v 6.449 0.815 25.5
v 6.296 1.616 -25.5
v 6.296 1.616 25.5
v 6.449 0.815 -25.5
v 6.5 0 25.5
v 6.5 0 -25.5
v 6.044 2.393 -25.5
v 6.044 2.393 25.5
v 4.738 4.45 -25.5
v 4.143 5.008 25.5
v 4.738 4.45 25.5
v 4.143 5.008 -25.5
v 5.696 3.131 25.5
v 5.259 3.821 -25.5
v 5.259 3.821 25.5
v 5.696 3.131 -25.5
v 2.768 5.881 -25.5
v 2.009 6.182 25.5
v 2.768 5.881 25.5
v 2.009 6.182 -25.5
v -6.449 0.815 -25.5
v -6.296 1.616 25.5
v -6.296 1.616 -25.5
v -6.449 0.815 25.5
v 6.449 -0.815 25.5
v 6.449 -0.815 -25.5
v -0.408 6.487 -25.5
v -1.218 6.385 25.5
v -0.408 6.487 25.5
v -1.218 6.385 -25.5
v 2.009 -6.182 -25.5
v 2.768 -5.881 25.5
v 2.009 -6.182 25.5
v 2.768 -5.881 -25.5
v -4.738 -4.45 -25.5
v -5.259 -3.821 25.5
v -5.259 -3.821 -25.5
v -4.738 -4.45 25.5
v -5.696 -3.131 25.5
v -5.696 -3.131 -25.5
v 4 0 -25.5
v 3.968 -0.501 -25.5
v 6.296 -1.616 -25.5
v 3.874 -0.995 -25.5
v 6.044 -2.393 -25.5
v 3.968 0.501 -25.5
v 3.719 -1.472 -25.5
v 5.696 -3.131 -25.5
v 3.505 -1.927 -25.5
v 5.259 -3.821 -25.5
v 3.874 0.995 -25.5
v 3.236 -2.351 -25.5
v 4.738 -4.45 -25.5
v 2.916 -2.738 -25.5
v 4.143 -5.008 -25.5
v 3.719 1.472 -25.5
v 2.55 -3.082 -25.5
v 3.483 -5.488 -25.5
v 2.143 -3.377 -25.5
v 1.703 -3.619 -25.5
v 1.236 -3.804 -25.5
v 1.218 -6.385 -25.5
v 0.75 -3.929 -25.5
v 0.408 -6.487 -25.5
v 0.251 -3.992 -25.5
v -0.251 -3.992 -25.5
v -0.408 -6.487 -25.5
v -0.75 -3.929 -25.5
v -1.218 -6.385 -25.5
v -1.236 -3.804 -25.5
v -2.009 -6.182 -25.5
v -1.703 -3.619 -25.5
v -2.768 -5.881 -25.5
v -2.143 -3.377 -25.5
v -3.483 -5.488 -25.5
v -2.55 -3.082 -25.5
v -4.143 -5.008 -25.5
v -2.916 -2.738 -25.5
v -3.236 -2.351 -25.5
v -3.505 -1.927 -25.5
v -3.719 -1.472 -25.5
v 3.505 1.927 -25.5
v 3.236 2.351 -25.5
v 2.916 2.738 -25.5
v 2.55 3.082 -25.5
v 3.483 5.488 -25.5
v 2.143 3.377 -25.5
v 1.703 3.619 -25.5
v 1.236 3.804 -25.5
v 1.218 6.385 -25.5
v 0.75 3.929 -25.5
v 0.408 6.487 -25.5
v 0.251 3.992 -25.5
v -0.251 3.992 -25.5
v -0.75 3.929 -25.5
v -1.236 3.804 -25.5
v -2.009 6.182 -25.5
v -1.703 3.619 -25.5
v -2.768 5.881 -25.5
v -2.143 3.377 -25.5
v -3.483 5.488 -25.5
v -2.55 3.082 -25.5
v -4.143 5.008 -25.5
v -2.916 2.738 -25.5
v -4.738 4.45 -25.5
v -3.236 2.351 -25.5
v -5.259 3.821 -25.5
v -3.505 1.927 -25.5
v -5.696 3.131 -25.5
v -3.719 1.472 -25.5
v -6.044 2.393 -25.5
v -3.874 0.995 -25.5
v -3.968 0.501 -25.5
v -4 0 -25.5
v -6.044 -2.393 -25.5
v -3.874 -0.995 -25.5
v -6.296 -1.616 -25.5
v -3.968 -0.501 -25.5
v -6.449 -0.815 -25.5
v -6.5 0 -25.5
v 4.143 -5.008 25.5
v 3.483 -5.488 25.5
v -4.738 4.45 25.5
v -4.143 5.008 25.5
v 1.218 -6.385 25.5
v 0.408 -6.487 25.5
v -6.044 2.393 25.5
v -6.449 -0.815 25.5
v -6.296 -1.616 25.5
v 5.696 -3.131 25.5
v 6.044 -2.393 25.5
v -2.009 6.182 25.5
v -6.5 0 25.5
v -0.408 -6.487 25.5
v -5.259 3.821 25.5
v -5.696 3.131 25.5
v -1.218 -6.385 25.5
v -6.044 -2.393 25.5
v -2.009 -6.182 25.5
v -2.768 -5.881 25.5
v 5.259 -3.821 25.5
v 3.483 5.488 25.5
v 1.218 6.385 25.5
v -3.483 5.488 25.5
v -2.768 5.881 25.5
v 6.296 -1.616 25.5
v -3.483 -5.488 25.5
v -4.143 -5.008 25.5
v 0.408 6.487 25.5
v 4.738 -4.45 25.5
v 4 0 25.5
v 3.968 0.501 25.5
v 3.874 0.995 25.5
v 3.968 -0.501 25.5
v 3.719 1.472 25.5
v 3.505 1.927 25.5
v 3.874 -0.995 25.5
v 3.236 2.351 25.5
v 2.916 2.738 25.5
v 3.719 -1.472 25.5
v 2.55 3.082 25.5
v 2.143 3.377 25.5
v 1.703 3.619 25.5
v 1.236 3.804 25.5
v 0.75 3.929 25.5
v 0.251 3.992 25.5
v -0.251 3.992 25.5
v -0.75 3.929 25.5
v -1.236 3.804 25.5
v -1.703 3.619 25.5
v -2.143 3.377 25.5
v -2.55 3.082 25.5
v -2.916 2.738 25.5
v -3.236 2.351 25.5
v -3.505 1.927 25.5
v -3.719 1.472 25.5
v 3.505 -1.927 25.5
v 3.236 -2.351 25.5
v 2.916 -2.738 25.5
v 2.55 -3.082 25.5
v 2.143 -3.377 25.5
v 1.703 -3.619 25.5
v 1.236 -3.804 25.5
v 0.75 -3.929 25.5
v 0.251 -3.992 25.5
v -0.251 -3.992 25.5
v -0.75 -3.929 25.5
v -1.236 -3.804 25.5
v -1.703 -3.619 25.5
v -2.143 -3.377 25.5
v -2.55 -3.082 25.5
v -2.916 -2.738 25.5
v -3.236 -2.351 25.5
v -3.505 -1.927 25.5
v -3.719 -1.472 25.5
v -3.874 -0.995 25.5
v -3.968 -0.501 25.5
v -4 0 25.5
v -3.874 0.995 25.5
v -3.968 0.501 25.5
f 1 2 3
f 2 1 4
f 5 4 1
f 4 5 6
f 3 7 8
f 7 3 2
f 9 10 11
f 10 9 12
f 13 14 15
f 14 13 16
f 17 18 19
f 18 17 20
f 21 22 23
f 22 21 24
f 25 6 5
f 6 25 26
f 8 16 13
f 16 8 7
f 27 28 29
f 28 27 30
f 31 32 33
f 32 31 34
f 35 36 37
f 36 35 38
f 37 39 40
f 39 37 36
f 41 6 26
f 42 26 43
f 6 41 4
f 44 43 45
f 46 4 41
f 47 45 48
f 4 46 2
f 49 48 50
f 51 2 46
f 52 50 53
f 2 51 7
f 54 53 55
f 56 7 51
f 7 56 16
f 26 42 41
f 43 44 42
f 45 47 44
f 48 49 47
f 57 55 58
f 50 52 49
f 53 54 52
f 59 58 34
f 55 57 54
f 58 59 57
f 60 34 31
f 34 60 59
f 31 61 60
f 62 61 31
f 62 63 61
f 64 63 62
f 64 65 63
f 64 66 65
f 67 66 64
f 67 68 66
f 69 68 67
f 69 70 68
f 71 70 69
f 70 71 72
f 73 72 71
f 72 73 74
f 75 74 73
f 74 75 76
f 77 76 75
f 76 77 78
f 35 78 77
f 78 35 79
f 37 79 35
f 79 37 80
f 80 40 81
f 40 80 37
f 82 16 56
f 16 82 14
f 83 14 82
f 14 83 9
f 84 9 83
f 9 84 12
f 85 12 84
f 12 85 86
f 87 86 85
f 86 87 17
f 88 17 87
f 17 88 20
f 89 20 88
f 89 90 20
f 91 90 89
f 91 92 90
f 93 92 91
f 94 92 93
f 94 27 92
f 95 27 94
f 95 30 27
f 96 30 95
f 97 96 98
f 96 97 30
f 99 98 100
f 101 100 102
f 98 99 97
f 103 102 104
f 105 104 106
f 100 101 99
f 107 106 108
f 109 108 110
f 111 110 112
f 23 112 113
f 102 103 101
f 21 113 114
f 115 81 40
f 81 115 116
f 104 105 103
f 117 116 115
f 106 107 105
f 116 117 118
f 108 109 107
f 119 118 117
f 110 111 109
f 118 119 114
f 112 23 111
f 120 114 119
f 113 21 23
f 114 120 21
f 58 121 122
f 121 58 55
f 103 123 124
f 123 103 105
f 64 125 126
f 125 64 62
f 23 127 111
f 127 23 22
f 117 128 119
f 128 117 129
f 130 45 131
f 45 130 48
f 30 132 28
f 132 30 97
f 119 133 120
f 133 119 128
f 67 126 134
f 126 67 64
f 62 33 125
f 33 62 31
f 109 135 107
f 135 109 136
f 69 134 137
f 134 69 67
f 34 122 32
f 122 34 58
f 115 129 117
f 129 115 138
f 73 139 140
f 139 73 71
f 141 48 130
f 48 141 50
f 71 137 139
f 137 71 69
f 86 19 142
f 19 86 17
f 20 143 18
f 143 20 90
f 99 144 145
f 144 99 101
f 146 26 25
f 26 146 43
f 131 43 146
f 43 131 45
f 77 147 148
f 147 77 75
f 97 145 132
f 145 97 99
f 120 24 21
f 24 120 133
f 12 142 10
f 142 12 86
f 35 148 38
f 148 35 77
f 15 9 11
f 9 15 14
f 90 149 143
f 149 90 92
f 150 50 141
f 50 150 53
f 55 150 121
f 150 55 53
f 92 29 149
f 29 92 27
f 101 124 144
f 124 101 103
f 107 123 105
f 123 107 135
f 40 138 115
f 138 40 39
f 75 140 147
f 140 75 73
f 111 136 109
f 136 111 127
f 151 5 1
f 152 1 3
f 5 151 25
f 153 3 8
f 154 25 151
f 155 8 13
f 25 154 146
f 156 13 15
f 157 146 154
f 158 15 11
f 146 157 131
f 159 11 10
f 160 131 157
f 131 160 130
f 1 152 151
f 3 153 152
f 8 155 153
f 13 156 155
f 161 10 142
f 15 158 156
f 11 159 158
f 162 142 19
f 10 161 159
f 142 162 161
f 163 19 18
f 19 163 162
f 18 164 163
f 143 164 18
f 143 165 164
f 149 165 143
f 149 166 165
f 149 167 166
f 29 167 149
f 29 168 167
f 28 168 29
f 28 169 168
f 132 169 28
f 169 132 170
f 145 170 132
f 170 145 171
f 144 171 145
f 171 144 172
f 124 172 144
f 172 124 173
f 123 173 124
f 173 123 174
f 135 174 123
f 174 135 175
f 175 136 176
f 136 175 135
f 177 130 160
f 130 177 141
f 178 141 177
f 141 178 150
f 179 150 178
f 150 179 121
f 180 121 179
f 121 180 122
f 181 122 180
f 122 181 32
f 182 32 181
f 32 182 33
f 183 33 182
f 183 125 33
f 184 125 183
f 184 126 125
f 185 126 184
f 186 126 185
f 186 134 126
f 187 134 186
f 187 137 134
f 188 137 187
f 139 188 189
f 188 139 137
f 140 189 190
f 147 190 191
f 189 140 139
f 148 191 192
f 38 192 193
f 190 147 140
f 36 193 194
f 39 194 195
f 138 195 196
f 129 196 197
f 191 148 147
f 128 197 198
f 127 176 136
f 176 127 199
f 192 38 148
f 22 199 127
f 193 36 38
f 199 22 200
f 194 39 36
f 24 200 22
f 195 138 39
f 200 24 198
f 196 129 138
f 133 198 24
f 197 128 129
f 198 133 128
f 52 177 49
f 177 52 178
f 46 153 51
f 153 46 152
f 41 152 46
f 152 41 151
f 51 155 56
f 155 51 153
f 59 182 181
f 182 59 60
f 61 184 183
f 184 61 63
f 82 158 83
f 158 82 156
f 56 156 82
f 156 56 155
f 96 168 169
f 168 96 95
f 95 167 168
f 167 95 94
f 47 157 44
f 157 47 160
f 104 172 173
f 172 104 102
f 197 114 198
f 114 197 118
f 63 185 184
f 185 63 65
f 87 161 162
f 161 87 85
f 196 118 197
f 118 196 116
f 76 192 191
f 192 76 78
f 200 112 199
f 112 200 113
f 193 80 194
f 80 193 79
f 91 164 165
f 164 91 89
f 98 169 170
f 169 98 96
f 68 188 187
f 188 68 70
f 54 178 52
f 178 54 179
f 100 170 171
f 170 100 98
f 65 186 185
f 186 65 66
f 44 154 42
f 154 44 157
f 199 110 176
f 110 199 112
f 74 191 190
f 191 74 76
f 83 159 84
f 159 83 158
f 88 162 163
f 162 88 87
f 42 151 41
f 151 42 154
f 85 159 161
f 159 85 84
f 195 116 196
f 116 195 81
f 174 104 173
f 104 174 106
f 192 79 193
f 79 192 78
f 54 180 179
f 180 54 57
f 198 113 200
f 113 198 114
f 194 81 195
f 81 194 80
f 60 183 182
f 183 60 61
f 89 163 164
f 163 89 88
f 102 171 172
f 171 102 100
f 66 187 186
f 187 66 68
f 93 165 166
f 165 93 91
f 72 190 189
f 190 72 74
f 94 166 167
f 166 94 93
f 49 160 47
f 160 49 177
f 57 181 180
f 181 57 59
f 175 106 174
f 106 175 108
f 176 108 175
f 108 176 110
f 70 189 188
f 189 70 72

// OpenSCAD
$fn = 50;


difference() {
	union() {
		translate(v = [0, 0, -25.5000000000]) {
			cylinder(h = 51, r = 6.5000000000);
		}
	}
	union() {
		translate(v = [0, 0, -100.0000000000]) {
			cylinder(h = 200, r = 4.0000000000);
		}
	}
}
